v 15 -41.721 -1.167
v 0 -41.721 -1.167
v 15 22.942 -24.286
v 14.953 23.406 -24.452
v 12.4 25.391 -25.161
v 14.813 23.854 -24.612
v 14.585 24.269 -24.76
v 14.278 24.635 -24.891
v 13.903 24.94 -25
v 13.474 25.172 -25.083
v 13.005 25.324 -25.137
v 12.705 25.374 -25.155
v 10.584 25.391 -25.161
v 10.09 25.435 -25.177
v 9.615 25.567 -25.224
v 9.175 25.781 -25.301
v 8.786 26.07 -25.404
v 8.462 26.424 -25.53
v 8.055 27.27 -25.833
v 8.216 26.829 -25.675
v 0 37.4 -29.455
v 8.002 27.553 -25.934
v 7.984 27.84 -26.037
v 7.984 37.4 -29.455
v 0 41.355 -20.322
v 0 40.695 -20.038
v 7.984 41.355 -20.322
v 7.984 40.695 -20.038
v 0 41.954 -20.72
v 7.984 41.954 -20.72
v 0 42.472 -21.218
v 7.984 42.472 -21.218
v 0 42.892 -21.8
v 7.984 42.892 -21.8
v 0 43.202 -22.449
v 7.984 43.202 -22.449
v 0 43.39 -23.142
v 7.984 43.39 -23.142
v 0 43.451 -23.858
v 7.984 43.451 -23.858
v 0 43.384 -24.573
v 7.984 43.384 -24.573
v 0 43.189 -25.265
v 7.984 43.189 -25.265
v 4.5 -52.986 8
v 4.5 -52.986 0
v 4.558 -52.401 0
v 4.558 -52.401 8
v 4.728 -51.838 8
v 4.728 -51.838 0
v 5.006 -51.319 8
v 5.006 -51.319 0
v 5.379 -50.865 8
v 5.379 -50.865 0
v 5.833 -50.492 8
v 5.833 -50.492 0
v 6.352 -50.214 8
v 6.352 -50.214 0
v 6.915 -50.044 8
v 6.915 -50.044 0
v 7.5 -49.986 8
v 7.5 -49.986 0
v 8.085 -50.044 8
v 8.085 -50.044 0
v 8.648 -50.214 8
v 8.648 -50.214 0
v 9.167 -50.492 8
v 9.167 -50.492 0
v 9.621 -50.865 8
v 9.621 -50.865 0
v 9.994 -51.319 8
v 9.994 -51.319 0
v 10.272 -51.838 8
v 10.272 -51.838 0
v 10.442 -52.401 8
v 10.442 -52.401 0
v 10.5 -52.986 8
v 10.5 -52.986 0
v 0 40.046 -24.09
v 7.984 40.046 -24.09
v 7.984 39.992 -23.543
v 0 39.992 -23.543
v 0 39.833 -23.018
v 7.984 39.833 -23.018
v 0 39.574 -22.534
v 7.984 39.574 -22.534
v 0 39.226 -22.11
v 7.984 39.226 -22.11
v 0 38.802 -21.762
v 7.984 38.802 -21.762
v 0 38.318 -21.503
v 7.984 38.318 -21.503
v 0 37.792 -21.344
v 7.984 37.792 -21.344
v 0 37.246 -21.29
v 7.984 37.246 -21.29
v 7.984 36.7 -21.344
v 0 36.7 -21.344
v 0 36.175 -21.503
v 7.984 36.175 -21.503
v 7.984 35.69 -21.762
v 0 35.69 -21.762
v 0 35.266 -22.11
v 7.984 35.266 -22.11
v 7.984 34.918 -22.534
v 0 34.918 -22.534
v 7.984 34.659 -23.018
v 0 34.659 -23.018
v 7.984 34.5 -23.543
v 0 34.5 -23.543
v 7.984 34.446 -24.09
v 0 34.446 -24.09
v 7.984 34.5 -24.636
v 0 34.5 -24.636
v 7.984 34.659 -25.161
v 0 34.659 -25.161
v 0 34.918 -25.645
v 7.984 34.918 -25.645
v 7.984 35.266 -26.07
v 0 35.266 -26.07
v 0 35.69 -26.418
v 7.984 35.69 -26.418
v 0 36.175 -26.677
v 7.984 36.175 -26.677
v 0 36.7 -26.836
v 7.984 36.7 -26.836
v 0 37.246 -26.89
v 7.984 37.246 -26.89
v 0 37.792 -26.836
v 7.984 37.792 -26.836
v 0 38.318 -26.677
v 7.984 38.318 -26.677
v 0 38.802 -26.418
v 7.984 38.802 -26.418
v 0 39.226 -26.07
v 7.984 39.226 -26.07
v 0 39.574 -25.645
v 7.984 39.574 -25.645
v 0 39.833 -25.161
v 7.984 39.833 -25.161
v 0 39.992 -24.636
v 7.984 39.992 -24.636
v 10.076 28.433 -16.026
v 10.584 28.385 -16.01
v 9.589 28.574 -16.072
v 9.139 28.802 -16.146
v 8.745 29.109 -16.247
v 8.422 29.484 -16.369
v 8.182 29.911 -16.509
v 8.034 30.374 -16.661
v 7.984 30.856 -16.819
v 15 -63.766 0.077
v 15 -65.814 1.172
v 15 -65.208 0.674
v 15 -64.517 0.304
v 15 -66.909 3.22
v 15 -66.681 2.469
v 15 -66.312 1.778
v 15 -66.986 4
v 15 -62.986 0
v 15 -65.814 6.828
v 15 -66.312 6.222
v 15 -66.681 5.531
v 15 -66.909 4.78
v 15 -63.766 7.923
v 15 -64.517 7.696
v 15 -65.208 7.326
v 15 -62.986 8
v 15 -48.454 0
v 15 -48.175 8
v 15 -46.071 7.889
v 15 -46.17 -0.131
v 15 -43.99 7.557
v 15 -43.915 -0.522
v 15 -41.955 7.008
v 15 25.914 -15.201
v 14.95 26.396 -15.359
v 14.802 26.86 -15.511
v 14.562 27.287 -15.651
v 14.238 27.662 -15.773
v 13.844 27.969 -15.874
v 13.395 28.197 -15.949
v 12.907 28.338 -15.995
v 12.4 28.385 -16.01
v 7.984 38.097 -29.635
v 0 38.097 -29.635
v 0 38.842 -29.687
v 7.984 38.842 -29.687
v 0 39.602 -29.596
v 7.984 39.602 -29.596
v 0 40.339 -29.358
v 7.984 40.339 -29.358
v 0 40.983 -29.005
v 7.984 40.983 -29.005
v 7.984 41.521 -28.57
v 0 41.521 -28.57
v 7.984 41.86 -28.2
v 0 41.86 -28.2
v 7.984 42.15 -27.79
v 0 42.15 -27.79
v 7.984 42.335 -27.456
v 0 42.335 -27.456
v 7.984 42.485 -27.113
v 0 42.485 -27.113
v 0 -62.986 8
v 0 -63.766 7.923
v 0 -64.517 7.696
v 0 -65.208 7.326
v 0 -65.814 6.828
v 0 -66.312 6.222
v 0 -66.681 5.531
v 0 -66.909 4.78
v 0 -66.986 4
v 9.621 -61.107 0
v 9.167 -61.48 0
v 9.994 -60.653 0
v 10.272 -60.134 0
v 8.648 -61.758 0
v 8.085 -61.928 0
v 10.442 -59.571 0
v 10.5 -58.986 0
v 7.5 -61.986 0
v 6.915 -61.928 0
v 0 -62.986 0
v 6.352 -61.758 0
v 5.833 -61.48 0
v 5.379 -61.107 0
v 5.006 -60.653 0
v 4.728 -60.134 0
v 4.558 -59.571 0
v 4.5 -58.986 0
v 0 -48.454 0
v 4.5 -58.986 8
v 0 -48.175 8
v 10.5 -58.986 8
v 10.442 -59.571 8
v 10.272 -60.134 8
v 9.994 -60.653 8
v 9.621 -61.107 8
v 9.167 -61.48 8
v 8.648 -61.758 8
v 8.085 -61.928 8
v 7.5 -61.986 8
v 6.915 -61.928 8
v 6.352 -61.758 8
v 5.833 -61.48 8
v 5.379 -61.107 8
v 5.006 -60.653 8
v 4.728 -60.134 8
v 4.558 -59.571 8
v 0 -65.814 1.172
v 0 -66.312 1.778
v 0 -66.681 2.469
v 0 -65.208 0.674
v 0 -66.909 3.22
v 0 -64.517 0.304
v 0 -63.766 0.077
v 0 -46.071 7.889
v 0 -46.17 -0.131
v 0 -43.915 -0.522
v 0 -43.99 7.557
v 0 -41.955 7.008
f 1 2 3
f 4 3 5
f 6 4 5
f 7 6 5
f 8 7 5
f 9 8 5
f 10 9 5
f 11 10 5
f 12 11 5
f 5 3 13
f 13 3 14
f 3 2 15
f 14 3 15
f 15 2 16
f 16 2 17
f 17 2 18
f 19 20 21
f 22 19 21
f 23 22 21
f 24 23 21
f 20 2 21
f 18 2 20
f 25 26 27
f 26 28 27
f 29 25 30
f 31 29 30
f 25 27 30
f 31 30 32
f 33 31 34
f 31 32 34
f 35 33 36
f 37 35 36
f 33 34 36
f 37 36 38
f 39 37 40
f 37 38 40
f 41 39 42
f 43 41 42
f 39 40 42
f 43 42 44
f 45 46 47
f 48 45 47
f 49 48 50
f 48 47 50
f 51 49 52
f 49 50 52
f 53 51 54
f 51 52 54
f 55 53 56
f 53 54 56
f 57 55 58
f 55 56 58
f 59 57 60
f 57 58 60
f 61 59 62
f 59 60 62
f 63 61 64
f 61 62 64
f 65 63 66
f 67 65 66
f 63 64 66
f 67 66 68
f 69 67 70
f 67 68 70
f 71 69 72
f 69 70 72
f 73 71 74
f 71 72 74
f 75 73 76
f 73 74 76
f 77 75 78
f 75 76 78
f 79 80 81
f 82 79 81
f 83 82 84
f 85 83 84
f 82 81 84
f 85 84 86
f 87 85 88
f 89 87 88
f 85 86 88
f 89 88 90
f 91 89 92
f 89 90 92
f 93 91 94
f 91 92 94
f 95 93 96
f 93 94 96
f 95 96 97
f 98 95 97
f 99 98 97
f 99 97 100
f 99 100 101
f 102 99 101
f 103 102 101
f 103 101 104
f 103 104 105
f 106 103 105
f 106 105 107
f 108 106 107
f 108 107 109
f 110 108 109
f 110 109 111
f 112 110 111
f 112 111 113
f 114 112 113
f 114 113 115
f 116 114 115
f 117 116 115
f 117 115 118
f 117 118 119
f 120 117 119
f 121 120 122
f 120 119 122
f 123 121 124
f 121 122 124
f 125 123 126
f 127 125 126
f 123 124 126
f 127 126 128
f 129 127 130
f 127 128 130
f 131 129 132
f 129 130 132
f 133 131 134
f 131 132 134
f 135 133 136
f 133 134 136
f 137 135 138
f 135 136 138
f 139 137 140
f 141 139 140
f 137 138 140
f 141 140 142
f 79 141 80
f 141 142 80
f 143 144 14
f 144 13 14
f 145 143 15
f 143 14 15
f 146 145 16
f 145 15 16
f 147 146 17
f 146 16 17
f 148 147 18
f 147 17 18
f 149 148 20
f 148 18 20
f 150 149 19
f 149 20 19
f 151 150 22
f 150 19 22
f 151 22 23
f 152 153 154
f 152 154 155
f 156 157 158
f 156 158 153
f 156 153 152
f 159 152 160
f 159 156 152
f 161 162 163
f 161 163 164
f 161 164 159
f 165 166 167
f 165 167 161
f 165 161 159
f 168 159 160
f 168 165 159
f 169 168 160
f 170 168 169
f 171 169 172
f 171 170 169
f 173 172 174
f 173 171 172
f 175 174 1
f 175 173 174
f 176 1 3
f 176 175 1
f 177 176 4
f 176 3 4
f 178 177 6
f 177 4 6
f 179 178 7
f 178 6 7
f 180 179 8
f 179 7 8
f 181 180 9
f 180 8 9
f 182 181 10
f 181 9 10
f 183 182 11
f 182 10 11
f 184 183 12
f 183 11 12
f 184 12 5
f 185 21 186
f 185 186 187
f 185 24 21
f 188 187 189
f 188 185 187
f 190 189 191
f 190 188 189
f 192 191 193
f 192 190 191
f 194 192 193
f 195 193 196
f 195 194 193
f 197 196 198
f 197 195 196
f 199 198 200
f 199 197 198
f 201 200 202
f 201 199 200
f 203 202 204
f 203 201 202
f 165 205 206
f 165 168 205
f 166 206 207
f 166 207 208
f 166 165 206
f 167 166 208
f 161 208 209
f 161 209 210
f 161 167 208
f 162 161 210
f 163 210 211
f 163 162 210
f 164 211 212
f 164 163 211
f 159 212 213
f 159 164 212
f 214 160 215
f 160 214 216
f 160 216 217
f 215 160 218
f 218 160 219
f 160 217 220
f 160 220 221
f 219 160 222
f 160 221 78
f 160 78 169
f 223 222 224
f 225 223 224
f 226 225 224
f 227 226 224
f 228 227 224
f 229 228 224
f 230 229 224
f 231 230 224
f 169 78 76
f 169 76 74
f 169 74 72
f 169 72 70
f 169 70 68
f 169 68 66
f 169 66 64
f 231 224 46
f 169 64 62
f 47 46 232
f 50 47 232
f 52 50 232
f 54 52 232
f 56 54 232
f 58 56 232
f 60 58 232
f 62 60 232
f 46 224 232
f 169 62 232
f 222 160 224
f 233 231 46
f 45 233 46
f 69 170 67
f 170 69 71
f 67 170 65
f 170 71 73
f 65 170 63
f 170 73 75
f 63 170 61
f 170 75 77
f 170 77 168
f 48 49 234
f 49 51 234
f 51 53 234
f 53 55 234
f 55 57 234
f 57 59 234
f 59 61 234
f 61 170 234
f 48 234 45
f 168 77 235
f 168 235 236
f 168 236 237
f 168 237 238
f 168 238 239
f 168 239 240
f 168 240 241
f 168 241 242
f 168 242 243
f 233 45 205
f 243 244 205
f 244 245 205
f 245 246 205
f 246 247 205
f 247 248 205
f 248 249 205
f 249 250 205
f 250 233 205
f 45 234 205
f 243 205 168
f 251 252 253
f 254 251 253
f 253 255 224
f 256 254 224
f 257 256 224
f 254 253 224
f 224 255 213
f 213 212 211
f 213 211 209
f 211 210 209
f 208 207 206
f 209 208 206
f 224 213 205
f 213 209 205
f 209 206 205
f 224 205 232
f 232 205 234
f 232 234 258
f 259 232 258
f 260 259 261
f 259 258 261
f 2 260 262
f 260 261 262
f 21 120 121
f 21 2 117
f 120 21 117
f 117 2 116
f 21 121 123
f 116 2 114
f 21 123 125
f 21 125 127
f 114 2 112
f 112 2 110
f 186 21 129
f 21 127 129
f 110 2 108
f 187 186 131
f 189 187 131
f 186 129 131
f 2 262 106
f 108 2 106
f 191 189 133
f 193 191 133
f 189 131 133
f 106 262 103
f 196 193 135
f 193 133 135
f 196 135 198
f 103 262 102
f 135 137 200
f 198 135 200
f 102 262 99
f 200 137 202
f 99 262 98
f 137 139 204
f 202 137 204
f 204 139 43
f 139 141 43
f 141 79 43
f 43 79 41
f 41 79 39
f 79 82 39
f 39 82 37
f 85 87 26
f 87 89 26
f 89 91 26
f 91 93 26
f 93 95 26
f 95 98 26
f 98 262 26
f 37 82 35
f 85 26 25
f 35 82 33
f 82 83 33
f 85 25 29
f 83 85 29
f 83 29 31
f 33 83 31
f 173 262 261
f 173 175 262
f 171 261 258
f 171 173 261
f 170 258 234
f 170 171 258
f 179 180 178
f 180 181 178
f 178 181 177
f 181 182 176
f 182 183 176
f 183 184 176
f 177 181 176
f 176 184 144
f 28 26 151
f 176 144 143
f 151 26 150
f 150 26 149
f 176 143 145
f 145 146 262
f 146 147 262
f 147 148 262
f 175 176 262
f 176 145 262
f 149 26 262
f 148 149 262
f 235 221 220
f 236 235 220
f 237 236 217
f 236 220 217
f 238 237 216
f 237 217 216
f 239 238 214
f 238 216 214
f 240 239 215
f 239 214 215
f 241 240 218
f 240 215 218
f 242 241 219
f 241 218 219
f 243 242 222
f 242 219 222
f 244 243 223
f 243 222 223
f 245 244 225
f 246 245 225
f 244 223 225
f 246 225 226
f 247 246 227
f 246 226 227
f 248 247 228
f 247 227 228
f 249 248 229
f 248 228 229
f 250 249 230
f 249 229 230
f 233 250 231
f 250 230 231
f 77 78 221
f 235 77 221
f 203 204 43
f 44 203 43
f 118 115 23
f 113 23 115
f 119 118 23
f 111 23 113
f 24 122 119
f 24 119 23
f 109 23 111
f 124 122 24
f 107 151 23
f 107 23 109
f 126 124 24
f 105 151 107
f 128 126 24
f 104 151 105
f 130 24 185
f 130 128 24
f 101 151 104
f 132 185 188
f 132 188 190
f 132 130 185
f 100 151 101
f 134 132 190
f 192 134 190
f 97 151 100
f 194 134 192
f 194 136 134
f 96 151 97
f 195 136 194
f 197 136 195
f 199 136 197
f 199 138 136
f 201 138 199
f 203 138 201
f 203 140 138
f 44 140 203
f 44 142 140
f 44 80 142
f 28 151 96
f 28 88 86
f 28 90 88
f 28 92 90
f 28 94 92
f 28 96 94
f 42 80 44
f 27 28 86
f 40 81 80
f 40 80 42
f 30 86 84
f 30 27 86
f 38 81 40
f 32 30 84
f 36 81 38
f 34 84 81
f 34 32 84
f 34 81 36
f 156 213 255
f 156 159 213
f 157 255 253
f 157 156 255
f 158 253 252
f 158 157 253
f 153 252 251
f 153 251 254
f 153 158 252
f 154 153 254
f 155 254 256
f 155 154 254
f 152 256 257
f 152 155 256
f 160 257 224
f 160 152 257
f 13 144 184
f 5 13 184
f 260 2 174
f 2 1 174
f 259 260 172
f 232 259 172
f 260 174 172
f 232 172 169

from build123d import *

# Parameters (mm, degrees)
F1_DEPTH = 15
F3_DEPTH = 25
F4_R     = 3.99999
F5_W     = 7.0163438655
F5_H     = 17.1485144225
F6_DEPTH = 25
F7_R     = 2.6
F8_R     = 2.8
F9_DEPTH = 25
F10_R    = 20
F11_R    = 4


# Not quite as in the source:
# - a fillet or chamfer is up to 0.001 mm smaller than in the source, because OpenCascade refuses the exact size


with BuildPart() as f1:
    # F0 (on Right) → F1 (new body)
    with BuildSketch(Plane.YZ):
        Polygon((-44.9859467229, 8), (-66.9859467229, 8), (-66.9859467229, 0), (-44.9859467229, 0), (41.0894067598, -30.7737162478), (42.3002508738, -27.5966470596), (43.3758810707, -24.7743584453), (44.6834651639, -21.3434583933), align=None)
    extrude(amount=F1_DEPTH)

    # F2 (on face) → F3 (cut)
    with BuildSketch(Plane(origin=(0, 0, 0), x_dir=(1, 0, 0), z_dir=(0, 0, -1))):
        with BuildLine():
            Line((4.5, 58.9859467229), (4.5, 52.9859467229))
            ThreePointArc((4.5, 52.9859467229), (7.5, 49.9859467229), (10.5, 52.9859467229))
            Line((10.5, 52.9859467229), (10.5, 58.9859467229))
            ThreePointArc((10.5, 58.9859467229), (7.5, 61.9859467229), (4.5, 58.9859467229))
        make_face()
    extrude(amount=-F3_DEPTH, mode=Mode.SUBTRACT)

    # F4 (radius 4 in the source; OpenCascade refuses exactly that, so slightly less here)
    f4_edges = [f1.edges().sort_by_distance(p)[0] for p in [
        (7.5, -66.985947, 0),
        (7.5, -66.985947, 8),
    ]]
    fillet(f4_edges, radius=F4_R)

    # F5 (on face) → F6 (cut)
    with BuildSketch(Plane(origin=(0, -1.9867064016, -6.0710906068), x_dir=(1, 0, 0), z_dir=(0, 0.3110113487, 0.9504061979))):
        with Locations((11.4918280672, 40.5312428041)):
            Rectangle(F5_W, F5_H)
        Polygon((15, 49.1055000154), (15, 31.9569855928), (21.9836561345, 31.9569855928), (21.9836561345, 65.9569855928), (7.9836561345, 65.9569855928), (7.9836561345, 49.1055000154), align=None)
    extrude(amount=-F6_DEPTH, mode=Mode.SUBTRACT)

    # F7
    f7_edges = [f1.edges().sort_by_distance(p)[0] for p in [
        (7.983656, 26.888111, -20.58561),
        (15, 26.888111, -20.58561),
    ]]
    fillet(f7_edges, radius=F7_R)

    # F8 (on face) → F9 (cut)
    with BuildSketch(Plane.YZ.offset(15)):
        with Locations((37.2460966017, -24.0897076146)):
            Circle(F8_R)
    extrude(amount=-F9_DEPTH, mode=Mode.SUBTRACT)

    # F10
    f10_edges = [f1.edges().sort_by_distance(p)[0] for p in [
        (7.5, -44.985947, 8),
        (7.5, -44.985947, 0),
    ]]
    fillet(f10_edges, radius=F10_R)

    # F11
    f11_edges = [f1.edges().sort_by_distance(p)[0] for p in [
        (3.991828, 41.089407, -30.773716),
        (3.991828, 44.683465, -21.343458),
    ]]
    fillet(f11_edges, radius=F11_R)


solid = f1.part
